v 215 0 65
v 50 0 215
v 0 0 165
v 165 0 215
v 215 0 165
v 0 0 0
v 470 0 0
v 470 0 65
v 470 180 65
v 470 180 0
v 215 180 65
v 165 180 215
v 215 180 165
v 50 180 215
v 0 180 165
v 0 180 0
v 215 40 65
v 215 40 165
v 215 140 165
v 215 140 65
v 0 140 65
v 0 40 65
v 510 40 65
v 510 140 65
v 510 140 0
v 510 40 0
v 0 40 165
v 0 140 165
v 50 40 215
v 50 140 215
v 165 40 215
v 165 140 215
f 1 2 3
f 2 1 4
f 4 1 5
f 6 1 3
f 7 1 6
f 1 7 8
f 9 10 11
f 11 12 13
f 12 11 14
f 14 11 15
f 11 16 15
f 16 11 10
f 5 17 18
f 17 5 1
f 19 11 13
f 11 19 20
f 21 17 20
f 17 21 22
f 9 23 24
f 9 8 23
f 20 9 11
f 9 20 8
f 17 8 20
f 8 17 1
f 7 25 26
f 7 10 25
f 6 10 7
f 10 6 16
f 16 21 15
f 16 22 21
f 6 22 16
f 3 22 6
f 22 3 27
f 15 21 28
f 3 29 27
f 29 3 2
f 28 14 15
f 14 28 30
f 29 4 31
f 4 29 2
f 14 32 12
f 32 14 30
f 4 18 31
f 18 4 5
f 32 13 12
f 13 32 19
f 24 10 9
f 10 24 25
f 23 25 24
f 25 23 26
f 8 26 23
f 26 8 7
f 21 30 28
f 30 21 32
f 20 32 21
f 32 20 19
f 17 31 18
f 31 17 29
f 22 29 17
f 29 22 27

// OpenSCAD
// Program made by Krzysztof Zajączkowski
// owner of page https://obliczeniowo.com.pl
// that let You draw stuff and export it
// to OpenSCAD format file

function distance(point1, point2) = sqrt(
      (point1[0] - point2[0]) * (point1[0] - point2[0])
      +
      (point1[1] - point2[1]) * (point1[1] - point2[1])
      +
      (point1[2] - point2[2]) * (point1[2] - point2[2])
    );
module cylinderByTwoPoints(r, point1, point2){

    alpha = atan2(point2[1] - point1[1], point2[0] - point1[0]);
    betha = atan2(sqrt(pow(point2[0] - point1[0], 2) + pow(point2[1] - point1[1], 2)), point2[2] - point1[2]);

    translate(point1)
    rotate([0, betha, alpha])
    cylinder(r = r, h = sqrt(
                pow(point2[0] - point1[0], 2) +
                pow(point2[1] - point1[1], 2) +
                pow(point2[2] - point1[2], 2)
                )
    );
}
module cylindersByPoints(r, points){
    union(){
        for(index = [0: 1: len(points) - 2])
        {
            point1 = len(points[index]) == 3 ? points[index] : [points[index][0], points[index][1], 0];
            point2 = len(points[index + 1]) == 3 ? points[index + 1] : [points[index + 1][0], points[index + 1][1], 0];
            cylinderByTwoPoints(r, point1, point2);
            if(index < len(points) - 2){
                translate(points[index + 1])
                sphere(r = r);
            }
        }
    }
}
module distX(point1, point2, length = 20, ray = 1, prefix="", size = 10){

    maxy = point1[1] > point2[1] ? point1[1] : point2[1];

    distx = distance(
      [
        point1[0],
        0,
        0
      ],
      [
        point2[0],
        0,
        0
      ]
    );

    if (distx) {

      color([0.1, 0.1, 0.1]){
          $fn = 20;
          dist = 4;
          cylindersByPoints(
              ray,
              [
                  point1,
                  [
                      point1[0],
                      maxy + length,
                      point1[2]
                  ]
              ]
          );
          cylindersByPoints(
              ray,
              [
                  point2,
                  [
                      point2[0],
                      maxy + length,
                      point2[2]
                  ]
              ]
          );
          cylindersByPoints(
              ray,
              [
                  [
                      point1[0],
                      maxy + length - dist * length / abs(length),
                      point1[2]
                  ],
                  [
                      point2[0],
                      maxy + length - dist * length / abs(length),
                      point1[2]
                  ]
              ]
          );

          angle = 180;

          translate(
                      [
                          (point1[0] + point2[0]) / 2,
                          maxy + length + ( length < 0 ? 2 * dist : 0) - size * 0.7,
                          point1[2]
                      ]
                  )
          rotate([0, 0, angle])
          text(text = str(prefix, distx), size = size, halign="center");
      }
    }
}
module distY (point1, point2, length = 20, ray = 1, prefix="", size = 10){

    maxx = point1[0] > point2[0] ? point1[0] : point2[0];

    disty = distance(
      [
          0,
          point1[1],
          0
      ],
      [
          0,
          point2[1],
          0
      ]
    );

    if (disty) {

        color([0.1, 0.1, 0.1]){
            $fn = 20;
            dist = 4;
            cylindersByPoints(
                ray,
                [
                    point1,
                    [
                        maxx + length,
                        point1[1],
                        point1[2]
                    ]
                ]
            );
            cylindersByPoints(
                ray,
                [
                    point2,
                    [
                        maxx + length,
                        point2[1],
                        point2[2]
                    ]
                ]
            );

            cylindersByPoints(
                ray,
                [
                    [
                        maxx + length - dist * length / abs(length),
                        point1[1],
                        point1[2]
                    ],
                    [
                        maxx + length - dist * length / abs(length),
                        point2[1],
                        point2[2]
                    ]
                ]
            );

            angle = 90;

            translate(
                        [
                            maxx +  + length + ( length < 0 ? 2 * dist : 0) - size * 0.7,
                            (point1[1] + point2[1]) / 2,
                            point1[2]
                        ]
                    )
            rotate([0, 0, angle])
            text(text = str(prefix, disty), size = size, halign="center");
        }
    }
}module Polygon_0(displayDistance = true) {

P0dx = 0;
P0dy = 0;
P0 = [P0dx, P0dy];

P1dx = 100;
P1dy = 0;
P1 = [P0[0] + P1dx, P0[1] + P1dy];

P2dx = -100;
P2dy = 100;
P2 = [P1[0] + P2dx, P1[1] + P2dy];

polygon([P0,
P1,
P2]);
if (displayDistance) {
distY(
          [
            P1[0],
            P1[1],
            2
          ],
          [
            P0[0],
            P0[1],
            2
          ],
          40,
          1,
          "P1dy = ",
          10
        );
distX(
          [
            P1[0],
            P1[1],
            2
          ],
          [
            P0[0],
            P0[1],
            2
          ],
          40,
          1,
          "P1dx = ",
          10
        );
distY(
          [
            P2[0],
            P2[1],
            2
          ],
          [
            P1[0],
            P1[1],
            2
          ],
          40,
          1,
          "P2dy = ",
          10
        );
distX(
          [
            P2[0],
            P2[1],
            2
          ],
          [
            P1[0],
            P1[1],
            2
          ],
          40,
          1,
          "P2dx = ",
          10
        );

}
}

module Polygon_1(displayDistance = true) {

P0dx = 300;
P0dy = 0;
P0 = [P0dx, P0dy];

P1dx = 0;
P1dy = -165;
P1 = [P0[0] + P1dx, P0[1] + P1dy];

P2dx = 50;
P2dy = -50;
P2 = [P1[0] + P2dx, P1[1] + P2dy];

P3dx = 115;
P3dy = 0;
P3 = [P2[0] + P3dx, P2[1] + P3dy];

P4dx = 50;
P4dy = 50;
P4 = [P3[0] + P4dx, P3[1] + P4dy];

P5dx = 0;
P5dy = 100;
P5 = [P4[0] + P5dx, P4[1] + P5dy];

P6dx = 300;
P6dy = 0;
P6 = [P5[0] + P6dx, P5[1] + P6dy];

P7dx = 0;
P7dy = 65;
P7 = [P6[0] + P7dx, P6[1] + P7dy];

polygon([P0,
P1,
P2,
P3,
P4,
P5,
P6,
P7]);
if (displayDistance) {
distY(
          [
            P1[0],
            P1[1],
            2
          ],
          [
            P0[0],
            P0[1],
            2
          ],
          40,
          1,
          "P1dy = ",
          10
        );
distX(
          [
            P1[0],
            P1[1],
            2
          ],
          [
            P0[0],
            P0[1],
            2
          ],
          40,
          1,
          "P1dx = ",
          10
        );
distY(
          [
            P2[0],
            P2[1],
            2
          ],
          [
            P1[0],
            P1[1],
            2
          ],
          40,
          1,
          "P2dy = ",
          10
        );
distX(
          [
            P2[0],
            P2[1],
            2
          ],
          [
            P1[0],
            P1[1],
            2
          ],
          40,
          1,
          "P2dx = ",
          10
        );
distY(
          [
            P3[0],
            P3[1],
            2
          ],
          [
            P2[0],
            P2[1],
            2
          ],
          40,
          1,
          "P3dy = ",
          10
        );
distX(
          [
            P3[0],
            P3[1],
            2
          ],
          [
            P2[0],
            P2[1],
            2
          ],
          40,
          1,
          "P3dx = ",
          10
        );
distY(
          [
            P4[0],
            P4[1],
            2
          ],
          [
            P3[0],
            P3[1],
            2
          ],
          40,
          1,
          "P4dy = ",
          10
        );
distX(
          [
            P4[0],
            P4[1],
            2
          ],
          [
            P3[0],
            P3[1],
            2
          ],
          40,
          1,
          "P4dx = ",
          10
        );
distY(
          [
            P5[0],
            P5[1],
            2
          ],
          [
            P4[0],
            P4[1],
            2
          ],
          40,
          1,
          "P5dy = ",
          10
        );
distX(
          [
            P5[0],
            P5[1],
            2
          ],
          [
            P4[0],
            P4[1],
            2
          ],
          40,
          1,
          "P5dx = ",
          10
        );
distY(
          [
            P6[0],
            P6[1],
            2
          ],
          [
            P5[0],
            P5[1],
            2
          ],
          40,
          1,
          "P6dy = ",
          10
        );
distX(
          [
            P6[0],
            P6[1],
            2
          ],
          [
            P5[0],
            P5[1],
            2
          ],
          40,
          1,
          "P6dx = ",
          10
        );
distY(
          [
            P7[0],
            P7[1],
            2
          ],
          [
            P6[0],
            P6[1],
            2
          ],
          40,
          1,
          "P7dy = ",
          10
        );
distX(
          [
            P7[0],
            P7[1],
            2
          ],
          [
            P6[0],
            P6[1],
            2
          ],
          40,
          1,
          "P7dx = ",
          10
        );

}
}

module Polygon_2(displayDistance = true) {

P0dx = 300;
P0dy = 0;
P0 = [P0dx, P0dy];

P1dx = 470;
P1dy = 0;
P1 = [P0[0] + P1dx, P0[1] + P1dy];

P2dx = 40;
P2dy = 40;
P2 = [P1[0] + P2dx, P1[1] + P2dy];

P3dx = 0;
P3dy = 100;
P3 = [P2[0] + P3dx, P2[1] + P3dy];

P4dx = -40;
P4dy = 40;
P4 = [P3[0] + P4dx, P3[1] + P4dy];

P5dx = -470;
P5dy = 0;
P5 = [P4[0] + P5dx, P4[1] + P5dy];

polygon([P0,
P1,
P2,
P3,
P4,
P5]);
if (displayDistance) {
distY(
          [
            P1[0],
            P1[1],
            2
          ],
          [
            P0[0],
            P0[1],
            2
          ],
          40,
          1,
          "P1dy = ",
          10
        );
distX(
          [
            P1[0],
            P1[1],
            2
          ],
          [
            P0[0],
            P0[1],
            2
          ],
          40,
          1,
          "P1dx = ",
          10
        );
distY(
          [
            P2[0],
            P2[1],
            2
          ],
          [
            P1[0],
            P1[1],
            2
          ],
          40,
          1,
          "P2dy = ",
          10
        );
distX(
          [
            P2[0],
            P2[1],
            2
          ],
          [
            P1[0],
            P1[1],
            2
          ],
          40,
          1,
          "P2dx = ",
          10
        );
distY(
          [
            P3[0],
            P3[1],
            2
          ],
          [
            P2[0],
            P2[1],
            2
          ],
          40,
          1,
          "P3dy = ",
          10
        );
distX(
          [
            P3[0],
            P3[1],
            2
          ],
          [
            P2[0],
            P2[1],
            2
          ],
          40,
          1,
          "P3dx = ",
          10
        );
distY(
          [
            P4[0],
            P4[1],
            2
          ],
          [
            P3[0],
            P3[1],
            2
          ],
          40,
          1,
          "P4dy = ",
          10
        );
distX(
          [
            P4[0],
            P4[1],
            2
          ],
          [
            P3[0],
            P3[1],
            2
          ],
          40,
          1,
          "P4dx = ",
          10
        );
distY(
          [
            P5[0],
            P5[1],
            2
          ],
          [
            P4[0],
            P4[1],
            2
          ],
          40,
          1,
          "P5dy = ",
          10
        );
distX(
          [
            P5[0],
            P5[1],
            2
          ],
          [
            P4[0],
            P4[1],
            2
          ],
          40,
          1,
          "P5dx = ",
          10
        );

}
}


module Polygon_3(displayDistance = true) {

P0dx = 300;
P0dy = 0;
P0 = [P0dx, P0dy];

P1dx = 0;
P1dy = 180;
P1 = [P0[0] + P1dx, P0[1] + P1dy];

P2dx = -215;
P2dy = 0;
P2 = [P1[0] + P2dx, P1[1] + P2dy];

P3dx = 0;
P3dy = -40;
P3 = [P2[0] + P3dx, P2[1] + P3dy];

P4dx = 150;
P4dy = 0;
P4 = [P3[0] + P4dx, P3[1] + P4dy];

P5dx = 0;
P5dy = -100;
P5 = [P4[0] + P5dx, P4[1] + P5dy];

P6dx = -150;
P6dy = 0;
P6 = [P5[0] + P6dx, P5[1] + P6dy];

P7dx = 0;
P7dy = -40;
P7 = [P6[0] + P7dx, P6[1] + P7dy];

polygon([P0,
P1,
P2,
P3,
P4,
P5,
P6,
P7]);
if (displayDistance) {
distY(
          [
            P1[0],
            P1[1],
            2
          ],
          [
            P0[0],
            P0[1],
            2
          ],
          40,
          1,
          "P1dy = ",
          10
        );
distX(
          [
            P1[0],
            P1[1],
            2
          ],
          [
            P0[0],
            P0[1],
            2
          ],
          40,
          1,
          "P1dx = ",
          10
        );
distY(
          [
            P2[0],
            P2[1],
            2
          ],
          [
            P1[0],
            P1[1],
            2
          ],
          40,
          1,
          "P2dy = ",
          10
        );
distX(
          [
            P2[0],
            P2[1],
            2
          ],
          [
            P1[0],
            P1[1],
            2
          ],
          40,
          1,
          "P2dx = ",
          10
        );
distY(
          [
            P3[0],
            P3[1],
            2
          ],
          [
            P2[0],
            P2[1],
            2
          ],
          40,
          1,
          "P3dy = ",
          10
        );
distX(
          [
            P3[0],
            P3[1],
            2
          ],
          [
            P2[0],
            P2[1],
            2
          ],
          40,
          1,
          "P3dx = ",
          10
        );
distY(
          [
            P4[0],
            P4[1],
            2
          ],
          [
            P3[0],
            P3[1],
            2
          ],
          40,
          1,
          "P4dy = ",
          10
        );
distX(
          [
            P4[0],
            P4[1],
            2
          ],
          [
            P3[0],
            P3[1],
            2
          ],
          40,
          1,
          "P4dx = ",
          10
        );
distY(
          [
            P5[0],
            P5[1],
            2
          ],
          [
            P4[0],
            P4[1],
            2
          ],
          40,
          1,
          "P5dy = ",
          10
        );
distX(
          [
            P5[0],
            P5[1],
            2
          ],
          [
            P4[0],
            P4[1],
            2
          ],
          40,
          1,
          "P5dx = ",
          10
        );
distY(
          [
            P6[0],
            P6[1],
            2
          ],
          [
            P5[0],
            P5[1],
            2
          ],
          40,
          1,
          "P6dy = ",
          10
        );
distX(
          [
            P6[0],
            P6[1],
            2
          ],
          [
            P5[0],
            P5[1],
            2
          ],
          40,
          1,
          "P6dx = ",
          10
        );
distY(
          [
            P7[0],
            P7[1],
            2
          ],
          [
            P6[0],
            P6[1],
            2
          ],
          40,
          1,
          "P7dy = ",
          10
        );
distX(
          [
            P7[0],
            P7[1],
            2
          ],
          [
            P6[0],
            P6[1],
            2
          ],
          40,
          1,
          "P7dx = ",
          10
        );

}
}
if (false) {
    translate([-300, 0, 0]){
        rotate([-90,0,0])
        Polygon_1(false);
        Polygon_2(false);
    }

    rotate([0, 90, 0])
    translate([-300, 0, 0])
    Polygon_3(false);
}

if (true) {
    intersection() {

        translate([-300, 0, 0]){
        intersection(){
            rotate([-90,0,0])
            linear_extrude(180)
            Polygon_1(false);
            linear_extrude(220)
            Polygon_2(false);
        }
        }

        rotate([0, 90, 0])
        linear_extrude(550)
        translate([-300, 0, 0])
        Polygon_3(false);
    }
}
